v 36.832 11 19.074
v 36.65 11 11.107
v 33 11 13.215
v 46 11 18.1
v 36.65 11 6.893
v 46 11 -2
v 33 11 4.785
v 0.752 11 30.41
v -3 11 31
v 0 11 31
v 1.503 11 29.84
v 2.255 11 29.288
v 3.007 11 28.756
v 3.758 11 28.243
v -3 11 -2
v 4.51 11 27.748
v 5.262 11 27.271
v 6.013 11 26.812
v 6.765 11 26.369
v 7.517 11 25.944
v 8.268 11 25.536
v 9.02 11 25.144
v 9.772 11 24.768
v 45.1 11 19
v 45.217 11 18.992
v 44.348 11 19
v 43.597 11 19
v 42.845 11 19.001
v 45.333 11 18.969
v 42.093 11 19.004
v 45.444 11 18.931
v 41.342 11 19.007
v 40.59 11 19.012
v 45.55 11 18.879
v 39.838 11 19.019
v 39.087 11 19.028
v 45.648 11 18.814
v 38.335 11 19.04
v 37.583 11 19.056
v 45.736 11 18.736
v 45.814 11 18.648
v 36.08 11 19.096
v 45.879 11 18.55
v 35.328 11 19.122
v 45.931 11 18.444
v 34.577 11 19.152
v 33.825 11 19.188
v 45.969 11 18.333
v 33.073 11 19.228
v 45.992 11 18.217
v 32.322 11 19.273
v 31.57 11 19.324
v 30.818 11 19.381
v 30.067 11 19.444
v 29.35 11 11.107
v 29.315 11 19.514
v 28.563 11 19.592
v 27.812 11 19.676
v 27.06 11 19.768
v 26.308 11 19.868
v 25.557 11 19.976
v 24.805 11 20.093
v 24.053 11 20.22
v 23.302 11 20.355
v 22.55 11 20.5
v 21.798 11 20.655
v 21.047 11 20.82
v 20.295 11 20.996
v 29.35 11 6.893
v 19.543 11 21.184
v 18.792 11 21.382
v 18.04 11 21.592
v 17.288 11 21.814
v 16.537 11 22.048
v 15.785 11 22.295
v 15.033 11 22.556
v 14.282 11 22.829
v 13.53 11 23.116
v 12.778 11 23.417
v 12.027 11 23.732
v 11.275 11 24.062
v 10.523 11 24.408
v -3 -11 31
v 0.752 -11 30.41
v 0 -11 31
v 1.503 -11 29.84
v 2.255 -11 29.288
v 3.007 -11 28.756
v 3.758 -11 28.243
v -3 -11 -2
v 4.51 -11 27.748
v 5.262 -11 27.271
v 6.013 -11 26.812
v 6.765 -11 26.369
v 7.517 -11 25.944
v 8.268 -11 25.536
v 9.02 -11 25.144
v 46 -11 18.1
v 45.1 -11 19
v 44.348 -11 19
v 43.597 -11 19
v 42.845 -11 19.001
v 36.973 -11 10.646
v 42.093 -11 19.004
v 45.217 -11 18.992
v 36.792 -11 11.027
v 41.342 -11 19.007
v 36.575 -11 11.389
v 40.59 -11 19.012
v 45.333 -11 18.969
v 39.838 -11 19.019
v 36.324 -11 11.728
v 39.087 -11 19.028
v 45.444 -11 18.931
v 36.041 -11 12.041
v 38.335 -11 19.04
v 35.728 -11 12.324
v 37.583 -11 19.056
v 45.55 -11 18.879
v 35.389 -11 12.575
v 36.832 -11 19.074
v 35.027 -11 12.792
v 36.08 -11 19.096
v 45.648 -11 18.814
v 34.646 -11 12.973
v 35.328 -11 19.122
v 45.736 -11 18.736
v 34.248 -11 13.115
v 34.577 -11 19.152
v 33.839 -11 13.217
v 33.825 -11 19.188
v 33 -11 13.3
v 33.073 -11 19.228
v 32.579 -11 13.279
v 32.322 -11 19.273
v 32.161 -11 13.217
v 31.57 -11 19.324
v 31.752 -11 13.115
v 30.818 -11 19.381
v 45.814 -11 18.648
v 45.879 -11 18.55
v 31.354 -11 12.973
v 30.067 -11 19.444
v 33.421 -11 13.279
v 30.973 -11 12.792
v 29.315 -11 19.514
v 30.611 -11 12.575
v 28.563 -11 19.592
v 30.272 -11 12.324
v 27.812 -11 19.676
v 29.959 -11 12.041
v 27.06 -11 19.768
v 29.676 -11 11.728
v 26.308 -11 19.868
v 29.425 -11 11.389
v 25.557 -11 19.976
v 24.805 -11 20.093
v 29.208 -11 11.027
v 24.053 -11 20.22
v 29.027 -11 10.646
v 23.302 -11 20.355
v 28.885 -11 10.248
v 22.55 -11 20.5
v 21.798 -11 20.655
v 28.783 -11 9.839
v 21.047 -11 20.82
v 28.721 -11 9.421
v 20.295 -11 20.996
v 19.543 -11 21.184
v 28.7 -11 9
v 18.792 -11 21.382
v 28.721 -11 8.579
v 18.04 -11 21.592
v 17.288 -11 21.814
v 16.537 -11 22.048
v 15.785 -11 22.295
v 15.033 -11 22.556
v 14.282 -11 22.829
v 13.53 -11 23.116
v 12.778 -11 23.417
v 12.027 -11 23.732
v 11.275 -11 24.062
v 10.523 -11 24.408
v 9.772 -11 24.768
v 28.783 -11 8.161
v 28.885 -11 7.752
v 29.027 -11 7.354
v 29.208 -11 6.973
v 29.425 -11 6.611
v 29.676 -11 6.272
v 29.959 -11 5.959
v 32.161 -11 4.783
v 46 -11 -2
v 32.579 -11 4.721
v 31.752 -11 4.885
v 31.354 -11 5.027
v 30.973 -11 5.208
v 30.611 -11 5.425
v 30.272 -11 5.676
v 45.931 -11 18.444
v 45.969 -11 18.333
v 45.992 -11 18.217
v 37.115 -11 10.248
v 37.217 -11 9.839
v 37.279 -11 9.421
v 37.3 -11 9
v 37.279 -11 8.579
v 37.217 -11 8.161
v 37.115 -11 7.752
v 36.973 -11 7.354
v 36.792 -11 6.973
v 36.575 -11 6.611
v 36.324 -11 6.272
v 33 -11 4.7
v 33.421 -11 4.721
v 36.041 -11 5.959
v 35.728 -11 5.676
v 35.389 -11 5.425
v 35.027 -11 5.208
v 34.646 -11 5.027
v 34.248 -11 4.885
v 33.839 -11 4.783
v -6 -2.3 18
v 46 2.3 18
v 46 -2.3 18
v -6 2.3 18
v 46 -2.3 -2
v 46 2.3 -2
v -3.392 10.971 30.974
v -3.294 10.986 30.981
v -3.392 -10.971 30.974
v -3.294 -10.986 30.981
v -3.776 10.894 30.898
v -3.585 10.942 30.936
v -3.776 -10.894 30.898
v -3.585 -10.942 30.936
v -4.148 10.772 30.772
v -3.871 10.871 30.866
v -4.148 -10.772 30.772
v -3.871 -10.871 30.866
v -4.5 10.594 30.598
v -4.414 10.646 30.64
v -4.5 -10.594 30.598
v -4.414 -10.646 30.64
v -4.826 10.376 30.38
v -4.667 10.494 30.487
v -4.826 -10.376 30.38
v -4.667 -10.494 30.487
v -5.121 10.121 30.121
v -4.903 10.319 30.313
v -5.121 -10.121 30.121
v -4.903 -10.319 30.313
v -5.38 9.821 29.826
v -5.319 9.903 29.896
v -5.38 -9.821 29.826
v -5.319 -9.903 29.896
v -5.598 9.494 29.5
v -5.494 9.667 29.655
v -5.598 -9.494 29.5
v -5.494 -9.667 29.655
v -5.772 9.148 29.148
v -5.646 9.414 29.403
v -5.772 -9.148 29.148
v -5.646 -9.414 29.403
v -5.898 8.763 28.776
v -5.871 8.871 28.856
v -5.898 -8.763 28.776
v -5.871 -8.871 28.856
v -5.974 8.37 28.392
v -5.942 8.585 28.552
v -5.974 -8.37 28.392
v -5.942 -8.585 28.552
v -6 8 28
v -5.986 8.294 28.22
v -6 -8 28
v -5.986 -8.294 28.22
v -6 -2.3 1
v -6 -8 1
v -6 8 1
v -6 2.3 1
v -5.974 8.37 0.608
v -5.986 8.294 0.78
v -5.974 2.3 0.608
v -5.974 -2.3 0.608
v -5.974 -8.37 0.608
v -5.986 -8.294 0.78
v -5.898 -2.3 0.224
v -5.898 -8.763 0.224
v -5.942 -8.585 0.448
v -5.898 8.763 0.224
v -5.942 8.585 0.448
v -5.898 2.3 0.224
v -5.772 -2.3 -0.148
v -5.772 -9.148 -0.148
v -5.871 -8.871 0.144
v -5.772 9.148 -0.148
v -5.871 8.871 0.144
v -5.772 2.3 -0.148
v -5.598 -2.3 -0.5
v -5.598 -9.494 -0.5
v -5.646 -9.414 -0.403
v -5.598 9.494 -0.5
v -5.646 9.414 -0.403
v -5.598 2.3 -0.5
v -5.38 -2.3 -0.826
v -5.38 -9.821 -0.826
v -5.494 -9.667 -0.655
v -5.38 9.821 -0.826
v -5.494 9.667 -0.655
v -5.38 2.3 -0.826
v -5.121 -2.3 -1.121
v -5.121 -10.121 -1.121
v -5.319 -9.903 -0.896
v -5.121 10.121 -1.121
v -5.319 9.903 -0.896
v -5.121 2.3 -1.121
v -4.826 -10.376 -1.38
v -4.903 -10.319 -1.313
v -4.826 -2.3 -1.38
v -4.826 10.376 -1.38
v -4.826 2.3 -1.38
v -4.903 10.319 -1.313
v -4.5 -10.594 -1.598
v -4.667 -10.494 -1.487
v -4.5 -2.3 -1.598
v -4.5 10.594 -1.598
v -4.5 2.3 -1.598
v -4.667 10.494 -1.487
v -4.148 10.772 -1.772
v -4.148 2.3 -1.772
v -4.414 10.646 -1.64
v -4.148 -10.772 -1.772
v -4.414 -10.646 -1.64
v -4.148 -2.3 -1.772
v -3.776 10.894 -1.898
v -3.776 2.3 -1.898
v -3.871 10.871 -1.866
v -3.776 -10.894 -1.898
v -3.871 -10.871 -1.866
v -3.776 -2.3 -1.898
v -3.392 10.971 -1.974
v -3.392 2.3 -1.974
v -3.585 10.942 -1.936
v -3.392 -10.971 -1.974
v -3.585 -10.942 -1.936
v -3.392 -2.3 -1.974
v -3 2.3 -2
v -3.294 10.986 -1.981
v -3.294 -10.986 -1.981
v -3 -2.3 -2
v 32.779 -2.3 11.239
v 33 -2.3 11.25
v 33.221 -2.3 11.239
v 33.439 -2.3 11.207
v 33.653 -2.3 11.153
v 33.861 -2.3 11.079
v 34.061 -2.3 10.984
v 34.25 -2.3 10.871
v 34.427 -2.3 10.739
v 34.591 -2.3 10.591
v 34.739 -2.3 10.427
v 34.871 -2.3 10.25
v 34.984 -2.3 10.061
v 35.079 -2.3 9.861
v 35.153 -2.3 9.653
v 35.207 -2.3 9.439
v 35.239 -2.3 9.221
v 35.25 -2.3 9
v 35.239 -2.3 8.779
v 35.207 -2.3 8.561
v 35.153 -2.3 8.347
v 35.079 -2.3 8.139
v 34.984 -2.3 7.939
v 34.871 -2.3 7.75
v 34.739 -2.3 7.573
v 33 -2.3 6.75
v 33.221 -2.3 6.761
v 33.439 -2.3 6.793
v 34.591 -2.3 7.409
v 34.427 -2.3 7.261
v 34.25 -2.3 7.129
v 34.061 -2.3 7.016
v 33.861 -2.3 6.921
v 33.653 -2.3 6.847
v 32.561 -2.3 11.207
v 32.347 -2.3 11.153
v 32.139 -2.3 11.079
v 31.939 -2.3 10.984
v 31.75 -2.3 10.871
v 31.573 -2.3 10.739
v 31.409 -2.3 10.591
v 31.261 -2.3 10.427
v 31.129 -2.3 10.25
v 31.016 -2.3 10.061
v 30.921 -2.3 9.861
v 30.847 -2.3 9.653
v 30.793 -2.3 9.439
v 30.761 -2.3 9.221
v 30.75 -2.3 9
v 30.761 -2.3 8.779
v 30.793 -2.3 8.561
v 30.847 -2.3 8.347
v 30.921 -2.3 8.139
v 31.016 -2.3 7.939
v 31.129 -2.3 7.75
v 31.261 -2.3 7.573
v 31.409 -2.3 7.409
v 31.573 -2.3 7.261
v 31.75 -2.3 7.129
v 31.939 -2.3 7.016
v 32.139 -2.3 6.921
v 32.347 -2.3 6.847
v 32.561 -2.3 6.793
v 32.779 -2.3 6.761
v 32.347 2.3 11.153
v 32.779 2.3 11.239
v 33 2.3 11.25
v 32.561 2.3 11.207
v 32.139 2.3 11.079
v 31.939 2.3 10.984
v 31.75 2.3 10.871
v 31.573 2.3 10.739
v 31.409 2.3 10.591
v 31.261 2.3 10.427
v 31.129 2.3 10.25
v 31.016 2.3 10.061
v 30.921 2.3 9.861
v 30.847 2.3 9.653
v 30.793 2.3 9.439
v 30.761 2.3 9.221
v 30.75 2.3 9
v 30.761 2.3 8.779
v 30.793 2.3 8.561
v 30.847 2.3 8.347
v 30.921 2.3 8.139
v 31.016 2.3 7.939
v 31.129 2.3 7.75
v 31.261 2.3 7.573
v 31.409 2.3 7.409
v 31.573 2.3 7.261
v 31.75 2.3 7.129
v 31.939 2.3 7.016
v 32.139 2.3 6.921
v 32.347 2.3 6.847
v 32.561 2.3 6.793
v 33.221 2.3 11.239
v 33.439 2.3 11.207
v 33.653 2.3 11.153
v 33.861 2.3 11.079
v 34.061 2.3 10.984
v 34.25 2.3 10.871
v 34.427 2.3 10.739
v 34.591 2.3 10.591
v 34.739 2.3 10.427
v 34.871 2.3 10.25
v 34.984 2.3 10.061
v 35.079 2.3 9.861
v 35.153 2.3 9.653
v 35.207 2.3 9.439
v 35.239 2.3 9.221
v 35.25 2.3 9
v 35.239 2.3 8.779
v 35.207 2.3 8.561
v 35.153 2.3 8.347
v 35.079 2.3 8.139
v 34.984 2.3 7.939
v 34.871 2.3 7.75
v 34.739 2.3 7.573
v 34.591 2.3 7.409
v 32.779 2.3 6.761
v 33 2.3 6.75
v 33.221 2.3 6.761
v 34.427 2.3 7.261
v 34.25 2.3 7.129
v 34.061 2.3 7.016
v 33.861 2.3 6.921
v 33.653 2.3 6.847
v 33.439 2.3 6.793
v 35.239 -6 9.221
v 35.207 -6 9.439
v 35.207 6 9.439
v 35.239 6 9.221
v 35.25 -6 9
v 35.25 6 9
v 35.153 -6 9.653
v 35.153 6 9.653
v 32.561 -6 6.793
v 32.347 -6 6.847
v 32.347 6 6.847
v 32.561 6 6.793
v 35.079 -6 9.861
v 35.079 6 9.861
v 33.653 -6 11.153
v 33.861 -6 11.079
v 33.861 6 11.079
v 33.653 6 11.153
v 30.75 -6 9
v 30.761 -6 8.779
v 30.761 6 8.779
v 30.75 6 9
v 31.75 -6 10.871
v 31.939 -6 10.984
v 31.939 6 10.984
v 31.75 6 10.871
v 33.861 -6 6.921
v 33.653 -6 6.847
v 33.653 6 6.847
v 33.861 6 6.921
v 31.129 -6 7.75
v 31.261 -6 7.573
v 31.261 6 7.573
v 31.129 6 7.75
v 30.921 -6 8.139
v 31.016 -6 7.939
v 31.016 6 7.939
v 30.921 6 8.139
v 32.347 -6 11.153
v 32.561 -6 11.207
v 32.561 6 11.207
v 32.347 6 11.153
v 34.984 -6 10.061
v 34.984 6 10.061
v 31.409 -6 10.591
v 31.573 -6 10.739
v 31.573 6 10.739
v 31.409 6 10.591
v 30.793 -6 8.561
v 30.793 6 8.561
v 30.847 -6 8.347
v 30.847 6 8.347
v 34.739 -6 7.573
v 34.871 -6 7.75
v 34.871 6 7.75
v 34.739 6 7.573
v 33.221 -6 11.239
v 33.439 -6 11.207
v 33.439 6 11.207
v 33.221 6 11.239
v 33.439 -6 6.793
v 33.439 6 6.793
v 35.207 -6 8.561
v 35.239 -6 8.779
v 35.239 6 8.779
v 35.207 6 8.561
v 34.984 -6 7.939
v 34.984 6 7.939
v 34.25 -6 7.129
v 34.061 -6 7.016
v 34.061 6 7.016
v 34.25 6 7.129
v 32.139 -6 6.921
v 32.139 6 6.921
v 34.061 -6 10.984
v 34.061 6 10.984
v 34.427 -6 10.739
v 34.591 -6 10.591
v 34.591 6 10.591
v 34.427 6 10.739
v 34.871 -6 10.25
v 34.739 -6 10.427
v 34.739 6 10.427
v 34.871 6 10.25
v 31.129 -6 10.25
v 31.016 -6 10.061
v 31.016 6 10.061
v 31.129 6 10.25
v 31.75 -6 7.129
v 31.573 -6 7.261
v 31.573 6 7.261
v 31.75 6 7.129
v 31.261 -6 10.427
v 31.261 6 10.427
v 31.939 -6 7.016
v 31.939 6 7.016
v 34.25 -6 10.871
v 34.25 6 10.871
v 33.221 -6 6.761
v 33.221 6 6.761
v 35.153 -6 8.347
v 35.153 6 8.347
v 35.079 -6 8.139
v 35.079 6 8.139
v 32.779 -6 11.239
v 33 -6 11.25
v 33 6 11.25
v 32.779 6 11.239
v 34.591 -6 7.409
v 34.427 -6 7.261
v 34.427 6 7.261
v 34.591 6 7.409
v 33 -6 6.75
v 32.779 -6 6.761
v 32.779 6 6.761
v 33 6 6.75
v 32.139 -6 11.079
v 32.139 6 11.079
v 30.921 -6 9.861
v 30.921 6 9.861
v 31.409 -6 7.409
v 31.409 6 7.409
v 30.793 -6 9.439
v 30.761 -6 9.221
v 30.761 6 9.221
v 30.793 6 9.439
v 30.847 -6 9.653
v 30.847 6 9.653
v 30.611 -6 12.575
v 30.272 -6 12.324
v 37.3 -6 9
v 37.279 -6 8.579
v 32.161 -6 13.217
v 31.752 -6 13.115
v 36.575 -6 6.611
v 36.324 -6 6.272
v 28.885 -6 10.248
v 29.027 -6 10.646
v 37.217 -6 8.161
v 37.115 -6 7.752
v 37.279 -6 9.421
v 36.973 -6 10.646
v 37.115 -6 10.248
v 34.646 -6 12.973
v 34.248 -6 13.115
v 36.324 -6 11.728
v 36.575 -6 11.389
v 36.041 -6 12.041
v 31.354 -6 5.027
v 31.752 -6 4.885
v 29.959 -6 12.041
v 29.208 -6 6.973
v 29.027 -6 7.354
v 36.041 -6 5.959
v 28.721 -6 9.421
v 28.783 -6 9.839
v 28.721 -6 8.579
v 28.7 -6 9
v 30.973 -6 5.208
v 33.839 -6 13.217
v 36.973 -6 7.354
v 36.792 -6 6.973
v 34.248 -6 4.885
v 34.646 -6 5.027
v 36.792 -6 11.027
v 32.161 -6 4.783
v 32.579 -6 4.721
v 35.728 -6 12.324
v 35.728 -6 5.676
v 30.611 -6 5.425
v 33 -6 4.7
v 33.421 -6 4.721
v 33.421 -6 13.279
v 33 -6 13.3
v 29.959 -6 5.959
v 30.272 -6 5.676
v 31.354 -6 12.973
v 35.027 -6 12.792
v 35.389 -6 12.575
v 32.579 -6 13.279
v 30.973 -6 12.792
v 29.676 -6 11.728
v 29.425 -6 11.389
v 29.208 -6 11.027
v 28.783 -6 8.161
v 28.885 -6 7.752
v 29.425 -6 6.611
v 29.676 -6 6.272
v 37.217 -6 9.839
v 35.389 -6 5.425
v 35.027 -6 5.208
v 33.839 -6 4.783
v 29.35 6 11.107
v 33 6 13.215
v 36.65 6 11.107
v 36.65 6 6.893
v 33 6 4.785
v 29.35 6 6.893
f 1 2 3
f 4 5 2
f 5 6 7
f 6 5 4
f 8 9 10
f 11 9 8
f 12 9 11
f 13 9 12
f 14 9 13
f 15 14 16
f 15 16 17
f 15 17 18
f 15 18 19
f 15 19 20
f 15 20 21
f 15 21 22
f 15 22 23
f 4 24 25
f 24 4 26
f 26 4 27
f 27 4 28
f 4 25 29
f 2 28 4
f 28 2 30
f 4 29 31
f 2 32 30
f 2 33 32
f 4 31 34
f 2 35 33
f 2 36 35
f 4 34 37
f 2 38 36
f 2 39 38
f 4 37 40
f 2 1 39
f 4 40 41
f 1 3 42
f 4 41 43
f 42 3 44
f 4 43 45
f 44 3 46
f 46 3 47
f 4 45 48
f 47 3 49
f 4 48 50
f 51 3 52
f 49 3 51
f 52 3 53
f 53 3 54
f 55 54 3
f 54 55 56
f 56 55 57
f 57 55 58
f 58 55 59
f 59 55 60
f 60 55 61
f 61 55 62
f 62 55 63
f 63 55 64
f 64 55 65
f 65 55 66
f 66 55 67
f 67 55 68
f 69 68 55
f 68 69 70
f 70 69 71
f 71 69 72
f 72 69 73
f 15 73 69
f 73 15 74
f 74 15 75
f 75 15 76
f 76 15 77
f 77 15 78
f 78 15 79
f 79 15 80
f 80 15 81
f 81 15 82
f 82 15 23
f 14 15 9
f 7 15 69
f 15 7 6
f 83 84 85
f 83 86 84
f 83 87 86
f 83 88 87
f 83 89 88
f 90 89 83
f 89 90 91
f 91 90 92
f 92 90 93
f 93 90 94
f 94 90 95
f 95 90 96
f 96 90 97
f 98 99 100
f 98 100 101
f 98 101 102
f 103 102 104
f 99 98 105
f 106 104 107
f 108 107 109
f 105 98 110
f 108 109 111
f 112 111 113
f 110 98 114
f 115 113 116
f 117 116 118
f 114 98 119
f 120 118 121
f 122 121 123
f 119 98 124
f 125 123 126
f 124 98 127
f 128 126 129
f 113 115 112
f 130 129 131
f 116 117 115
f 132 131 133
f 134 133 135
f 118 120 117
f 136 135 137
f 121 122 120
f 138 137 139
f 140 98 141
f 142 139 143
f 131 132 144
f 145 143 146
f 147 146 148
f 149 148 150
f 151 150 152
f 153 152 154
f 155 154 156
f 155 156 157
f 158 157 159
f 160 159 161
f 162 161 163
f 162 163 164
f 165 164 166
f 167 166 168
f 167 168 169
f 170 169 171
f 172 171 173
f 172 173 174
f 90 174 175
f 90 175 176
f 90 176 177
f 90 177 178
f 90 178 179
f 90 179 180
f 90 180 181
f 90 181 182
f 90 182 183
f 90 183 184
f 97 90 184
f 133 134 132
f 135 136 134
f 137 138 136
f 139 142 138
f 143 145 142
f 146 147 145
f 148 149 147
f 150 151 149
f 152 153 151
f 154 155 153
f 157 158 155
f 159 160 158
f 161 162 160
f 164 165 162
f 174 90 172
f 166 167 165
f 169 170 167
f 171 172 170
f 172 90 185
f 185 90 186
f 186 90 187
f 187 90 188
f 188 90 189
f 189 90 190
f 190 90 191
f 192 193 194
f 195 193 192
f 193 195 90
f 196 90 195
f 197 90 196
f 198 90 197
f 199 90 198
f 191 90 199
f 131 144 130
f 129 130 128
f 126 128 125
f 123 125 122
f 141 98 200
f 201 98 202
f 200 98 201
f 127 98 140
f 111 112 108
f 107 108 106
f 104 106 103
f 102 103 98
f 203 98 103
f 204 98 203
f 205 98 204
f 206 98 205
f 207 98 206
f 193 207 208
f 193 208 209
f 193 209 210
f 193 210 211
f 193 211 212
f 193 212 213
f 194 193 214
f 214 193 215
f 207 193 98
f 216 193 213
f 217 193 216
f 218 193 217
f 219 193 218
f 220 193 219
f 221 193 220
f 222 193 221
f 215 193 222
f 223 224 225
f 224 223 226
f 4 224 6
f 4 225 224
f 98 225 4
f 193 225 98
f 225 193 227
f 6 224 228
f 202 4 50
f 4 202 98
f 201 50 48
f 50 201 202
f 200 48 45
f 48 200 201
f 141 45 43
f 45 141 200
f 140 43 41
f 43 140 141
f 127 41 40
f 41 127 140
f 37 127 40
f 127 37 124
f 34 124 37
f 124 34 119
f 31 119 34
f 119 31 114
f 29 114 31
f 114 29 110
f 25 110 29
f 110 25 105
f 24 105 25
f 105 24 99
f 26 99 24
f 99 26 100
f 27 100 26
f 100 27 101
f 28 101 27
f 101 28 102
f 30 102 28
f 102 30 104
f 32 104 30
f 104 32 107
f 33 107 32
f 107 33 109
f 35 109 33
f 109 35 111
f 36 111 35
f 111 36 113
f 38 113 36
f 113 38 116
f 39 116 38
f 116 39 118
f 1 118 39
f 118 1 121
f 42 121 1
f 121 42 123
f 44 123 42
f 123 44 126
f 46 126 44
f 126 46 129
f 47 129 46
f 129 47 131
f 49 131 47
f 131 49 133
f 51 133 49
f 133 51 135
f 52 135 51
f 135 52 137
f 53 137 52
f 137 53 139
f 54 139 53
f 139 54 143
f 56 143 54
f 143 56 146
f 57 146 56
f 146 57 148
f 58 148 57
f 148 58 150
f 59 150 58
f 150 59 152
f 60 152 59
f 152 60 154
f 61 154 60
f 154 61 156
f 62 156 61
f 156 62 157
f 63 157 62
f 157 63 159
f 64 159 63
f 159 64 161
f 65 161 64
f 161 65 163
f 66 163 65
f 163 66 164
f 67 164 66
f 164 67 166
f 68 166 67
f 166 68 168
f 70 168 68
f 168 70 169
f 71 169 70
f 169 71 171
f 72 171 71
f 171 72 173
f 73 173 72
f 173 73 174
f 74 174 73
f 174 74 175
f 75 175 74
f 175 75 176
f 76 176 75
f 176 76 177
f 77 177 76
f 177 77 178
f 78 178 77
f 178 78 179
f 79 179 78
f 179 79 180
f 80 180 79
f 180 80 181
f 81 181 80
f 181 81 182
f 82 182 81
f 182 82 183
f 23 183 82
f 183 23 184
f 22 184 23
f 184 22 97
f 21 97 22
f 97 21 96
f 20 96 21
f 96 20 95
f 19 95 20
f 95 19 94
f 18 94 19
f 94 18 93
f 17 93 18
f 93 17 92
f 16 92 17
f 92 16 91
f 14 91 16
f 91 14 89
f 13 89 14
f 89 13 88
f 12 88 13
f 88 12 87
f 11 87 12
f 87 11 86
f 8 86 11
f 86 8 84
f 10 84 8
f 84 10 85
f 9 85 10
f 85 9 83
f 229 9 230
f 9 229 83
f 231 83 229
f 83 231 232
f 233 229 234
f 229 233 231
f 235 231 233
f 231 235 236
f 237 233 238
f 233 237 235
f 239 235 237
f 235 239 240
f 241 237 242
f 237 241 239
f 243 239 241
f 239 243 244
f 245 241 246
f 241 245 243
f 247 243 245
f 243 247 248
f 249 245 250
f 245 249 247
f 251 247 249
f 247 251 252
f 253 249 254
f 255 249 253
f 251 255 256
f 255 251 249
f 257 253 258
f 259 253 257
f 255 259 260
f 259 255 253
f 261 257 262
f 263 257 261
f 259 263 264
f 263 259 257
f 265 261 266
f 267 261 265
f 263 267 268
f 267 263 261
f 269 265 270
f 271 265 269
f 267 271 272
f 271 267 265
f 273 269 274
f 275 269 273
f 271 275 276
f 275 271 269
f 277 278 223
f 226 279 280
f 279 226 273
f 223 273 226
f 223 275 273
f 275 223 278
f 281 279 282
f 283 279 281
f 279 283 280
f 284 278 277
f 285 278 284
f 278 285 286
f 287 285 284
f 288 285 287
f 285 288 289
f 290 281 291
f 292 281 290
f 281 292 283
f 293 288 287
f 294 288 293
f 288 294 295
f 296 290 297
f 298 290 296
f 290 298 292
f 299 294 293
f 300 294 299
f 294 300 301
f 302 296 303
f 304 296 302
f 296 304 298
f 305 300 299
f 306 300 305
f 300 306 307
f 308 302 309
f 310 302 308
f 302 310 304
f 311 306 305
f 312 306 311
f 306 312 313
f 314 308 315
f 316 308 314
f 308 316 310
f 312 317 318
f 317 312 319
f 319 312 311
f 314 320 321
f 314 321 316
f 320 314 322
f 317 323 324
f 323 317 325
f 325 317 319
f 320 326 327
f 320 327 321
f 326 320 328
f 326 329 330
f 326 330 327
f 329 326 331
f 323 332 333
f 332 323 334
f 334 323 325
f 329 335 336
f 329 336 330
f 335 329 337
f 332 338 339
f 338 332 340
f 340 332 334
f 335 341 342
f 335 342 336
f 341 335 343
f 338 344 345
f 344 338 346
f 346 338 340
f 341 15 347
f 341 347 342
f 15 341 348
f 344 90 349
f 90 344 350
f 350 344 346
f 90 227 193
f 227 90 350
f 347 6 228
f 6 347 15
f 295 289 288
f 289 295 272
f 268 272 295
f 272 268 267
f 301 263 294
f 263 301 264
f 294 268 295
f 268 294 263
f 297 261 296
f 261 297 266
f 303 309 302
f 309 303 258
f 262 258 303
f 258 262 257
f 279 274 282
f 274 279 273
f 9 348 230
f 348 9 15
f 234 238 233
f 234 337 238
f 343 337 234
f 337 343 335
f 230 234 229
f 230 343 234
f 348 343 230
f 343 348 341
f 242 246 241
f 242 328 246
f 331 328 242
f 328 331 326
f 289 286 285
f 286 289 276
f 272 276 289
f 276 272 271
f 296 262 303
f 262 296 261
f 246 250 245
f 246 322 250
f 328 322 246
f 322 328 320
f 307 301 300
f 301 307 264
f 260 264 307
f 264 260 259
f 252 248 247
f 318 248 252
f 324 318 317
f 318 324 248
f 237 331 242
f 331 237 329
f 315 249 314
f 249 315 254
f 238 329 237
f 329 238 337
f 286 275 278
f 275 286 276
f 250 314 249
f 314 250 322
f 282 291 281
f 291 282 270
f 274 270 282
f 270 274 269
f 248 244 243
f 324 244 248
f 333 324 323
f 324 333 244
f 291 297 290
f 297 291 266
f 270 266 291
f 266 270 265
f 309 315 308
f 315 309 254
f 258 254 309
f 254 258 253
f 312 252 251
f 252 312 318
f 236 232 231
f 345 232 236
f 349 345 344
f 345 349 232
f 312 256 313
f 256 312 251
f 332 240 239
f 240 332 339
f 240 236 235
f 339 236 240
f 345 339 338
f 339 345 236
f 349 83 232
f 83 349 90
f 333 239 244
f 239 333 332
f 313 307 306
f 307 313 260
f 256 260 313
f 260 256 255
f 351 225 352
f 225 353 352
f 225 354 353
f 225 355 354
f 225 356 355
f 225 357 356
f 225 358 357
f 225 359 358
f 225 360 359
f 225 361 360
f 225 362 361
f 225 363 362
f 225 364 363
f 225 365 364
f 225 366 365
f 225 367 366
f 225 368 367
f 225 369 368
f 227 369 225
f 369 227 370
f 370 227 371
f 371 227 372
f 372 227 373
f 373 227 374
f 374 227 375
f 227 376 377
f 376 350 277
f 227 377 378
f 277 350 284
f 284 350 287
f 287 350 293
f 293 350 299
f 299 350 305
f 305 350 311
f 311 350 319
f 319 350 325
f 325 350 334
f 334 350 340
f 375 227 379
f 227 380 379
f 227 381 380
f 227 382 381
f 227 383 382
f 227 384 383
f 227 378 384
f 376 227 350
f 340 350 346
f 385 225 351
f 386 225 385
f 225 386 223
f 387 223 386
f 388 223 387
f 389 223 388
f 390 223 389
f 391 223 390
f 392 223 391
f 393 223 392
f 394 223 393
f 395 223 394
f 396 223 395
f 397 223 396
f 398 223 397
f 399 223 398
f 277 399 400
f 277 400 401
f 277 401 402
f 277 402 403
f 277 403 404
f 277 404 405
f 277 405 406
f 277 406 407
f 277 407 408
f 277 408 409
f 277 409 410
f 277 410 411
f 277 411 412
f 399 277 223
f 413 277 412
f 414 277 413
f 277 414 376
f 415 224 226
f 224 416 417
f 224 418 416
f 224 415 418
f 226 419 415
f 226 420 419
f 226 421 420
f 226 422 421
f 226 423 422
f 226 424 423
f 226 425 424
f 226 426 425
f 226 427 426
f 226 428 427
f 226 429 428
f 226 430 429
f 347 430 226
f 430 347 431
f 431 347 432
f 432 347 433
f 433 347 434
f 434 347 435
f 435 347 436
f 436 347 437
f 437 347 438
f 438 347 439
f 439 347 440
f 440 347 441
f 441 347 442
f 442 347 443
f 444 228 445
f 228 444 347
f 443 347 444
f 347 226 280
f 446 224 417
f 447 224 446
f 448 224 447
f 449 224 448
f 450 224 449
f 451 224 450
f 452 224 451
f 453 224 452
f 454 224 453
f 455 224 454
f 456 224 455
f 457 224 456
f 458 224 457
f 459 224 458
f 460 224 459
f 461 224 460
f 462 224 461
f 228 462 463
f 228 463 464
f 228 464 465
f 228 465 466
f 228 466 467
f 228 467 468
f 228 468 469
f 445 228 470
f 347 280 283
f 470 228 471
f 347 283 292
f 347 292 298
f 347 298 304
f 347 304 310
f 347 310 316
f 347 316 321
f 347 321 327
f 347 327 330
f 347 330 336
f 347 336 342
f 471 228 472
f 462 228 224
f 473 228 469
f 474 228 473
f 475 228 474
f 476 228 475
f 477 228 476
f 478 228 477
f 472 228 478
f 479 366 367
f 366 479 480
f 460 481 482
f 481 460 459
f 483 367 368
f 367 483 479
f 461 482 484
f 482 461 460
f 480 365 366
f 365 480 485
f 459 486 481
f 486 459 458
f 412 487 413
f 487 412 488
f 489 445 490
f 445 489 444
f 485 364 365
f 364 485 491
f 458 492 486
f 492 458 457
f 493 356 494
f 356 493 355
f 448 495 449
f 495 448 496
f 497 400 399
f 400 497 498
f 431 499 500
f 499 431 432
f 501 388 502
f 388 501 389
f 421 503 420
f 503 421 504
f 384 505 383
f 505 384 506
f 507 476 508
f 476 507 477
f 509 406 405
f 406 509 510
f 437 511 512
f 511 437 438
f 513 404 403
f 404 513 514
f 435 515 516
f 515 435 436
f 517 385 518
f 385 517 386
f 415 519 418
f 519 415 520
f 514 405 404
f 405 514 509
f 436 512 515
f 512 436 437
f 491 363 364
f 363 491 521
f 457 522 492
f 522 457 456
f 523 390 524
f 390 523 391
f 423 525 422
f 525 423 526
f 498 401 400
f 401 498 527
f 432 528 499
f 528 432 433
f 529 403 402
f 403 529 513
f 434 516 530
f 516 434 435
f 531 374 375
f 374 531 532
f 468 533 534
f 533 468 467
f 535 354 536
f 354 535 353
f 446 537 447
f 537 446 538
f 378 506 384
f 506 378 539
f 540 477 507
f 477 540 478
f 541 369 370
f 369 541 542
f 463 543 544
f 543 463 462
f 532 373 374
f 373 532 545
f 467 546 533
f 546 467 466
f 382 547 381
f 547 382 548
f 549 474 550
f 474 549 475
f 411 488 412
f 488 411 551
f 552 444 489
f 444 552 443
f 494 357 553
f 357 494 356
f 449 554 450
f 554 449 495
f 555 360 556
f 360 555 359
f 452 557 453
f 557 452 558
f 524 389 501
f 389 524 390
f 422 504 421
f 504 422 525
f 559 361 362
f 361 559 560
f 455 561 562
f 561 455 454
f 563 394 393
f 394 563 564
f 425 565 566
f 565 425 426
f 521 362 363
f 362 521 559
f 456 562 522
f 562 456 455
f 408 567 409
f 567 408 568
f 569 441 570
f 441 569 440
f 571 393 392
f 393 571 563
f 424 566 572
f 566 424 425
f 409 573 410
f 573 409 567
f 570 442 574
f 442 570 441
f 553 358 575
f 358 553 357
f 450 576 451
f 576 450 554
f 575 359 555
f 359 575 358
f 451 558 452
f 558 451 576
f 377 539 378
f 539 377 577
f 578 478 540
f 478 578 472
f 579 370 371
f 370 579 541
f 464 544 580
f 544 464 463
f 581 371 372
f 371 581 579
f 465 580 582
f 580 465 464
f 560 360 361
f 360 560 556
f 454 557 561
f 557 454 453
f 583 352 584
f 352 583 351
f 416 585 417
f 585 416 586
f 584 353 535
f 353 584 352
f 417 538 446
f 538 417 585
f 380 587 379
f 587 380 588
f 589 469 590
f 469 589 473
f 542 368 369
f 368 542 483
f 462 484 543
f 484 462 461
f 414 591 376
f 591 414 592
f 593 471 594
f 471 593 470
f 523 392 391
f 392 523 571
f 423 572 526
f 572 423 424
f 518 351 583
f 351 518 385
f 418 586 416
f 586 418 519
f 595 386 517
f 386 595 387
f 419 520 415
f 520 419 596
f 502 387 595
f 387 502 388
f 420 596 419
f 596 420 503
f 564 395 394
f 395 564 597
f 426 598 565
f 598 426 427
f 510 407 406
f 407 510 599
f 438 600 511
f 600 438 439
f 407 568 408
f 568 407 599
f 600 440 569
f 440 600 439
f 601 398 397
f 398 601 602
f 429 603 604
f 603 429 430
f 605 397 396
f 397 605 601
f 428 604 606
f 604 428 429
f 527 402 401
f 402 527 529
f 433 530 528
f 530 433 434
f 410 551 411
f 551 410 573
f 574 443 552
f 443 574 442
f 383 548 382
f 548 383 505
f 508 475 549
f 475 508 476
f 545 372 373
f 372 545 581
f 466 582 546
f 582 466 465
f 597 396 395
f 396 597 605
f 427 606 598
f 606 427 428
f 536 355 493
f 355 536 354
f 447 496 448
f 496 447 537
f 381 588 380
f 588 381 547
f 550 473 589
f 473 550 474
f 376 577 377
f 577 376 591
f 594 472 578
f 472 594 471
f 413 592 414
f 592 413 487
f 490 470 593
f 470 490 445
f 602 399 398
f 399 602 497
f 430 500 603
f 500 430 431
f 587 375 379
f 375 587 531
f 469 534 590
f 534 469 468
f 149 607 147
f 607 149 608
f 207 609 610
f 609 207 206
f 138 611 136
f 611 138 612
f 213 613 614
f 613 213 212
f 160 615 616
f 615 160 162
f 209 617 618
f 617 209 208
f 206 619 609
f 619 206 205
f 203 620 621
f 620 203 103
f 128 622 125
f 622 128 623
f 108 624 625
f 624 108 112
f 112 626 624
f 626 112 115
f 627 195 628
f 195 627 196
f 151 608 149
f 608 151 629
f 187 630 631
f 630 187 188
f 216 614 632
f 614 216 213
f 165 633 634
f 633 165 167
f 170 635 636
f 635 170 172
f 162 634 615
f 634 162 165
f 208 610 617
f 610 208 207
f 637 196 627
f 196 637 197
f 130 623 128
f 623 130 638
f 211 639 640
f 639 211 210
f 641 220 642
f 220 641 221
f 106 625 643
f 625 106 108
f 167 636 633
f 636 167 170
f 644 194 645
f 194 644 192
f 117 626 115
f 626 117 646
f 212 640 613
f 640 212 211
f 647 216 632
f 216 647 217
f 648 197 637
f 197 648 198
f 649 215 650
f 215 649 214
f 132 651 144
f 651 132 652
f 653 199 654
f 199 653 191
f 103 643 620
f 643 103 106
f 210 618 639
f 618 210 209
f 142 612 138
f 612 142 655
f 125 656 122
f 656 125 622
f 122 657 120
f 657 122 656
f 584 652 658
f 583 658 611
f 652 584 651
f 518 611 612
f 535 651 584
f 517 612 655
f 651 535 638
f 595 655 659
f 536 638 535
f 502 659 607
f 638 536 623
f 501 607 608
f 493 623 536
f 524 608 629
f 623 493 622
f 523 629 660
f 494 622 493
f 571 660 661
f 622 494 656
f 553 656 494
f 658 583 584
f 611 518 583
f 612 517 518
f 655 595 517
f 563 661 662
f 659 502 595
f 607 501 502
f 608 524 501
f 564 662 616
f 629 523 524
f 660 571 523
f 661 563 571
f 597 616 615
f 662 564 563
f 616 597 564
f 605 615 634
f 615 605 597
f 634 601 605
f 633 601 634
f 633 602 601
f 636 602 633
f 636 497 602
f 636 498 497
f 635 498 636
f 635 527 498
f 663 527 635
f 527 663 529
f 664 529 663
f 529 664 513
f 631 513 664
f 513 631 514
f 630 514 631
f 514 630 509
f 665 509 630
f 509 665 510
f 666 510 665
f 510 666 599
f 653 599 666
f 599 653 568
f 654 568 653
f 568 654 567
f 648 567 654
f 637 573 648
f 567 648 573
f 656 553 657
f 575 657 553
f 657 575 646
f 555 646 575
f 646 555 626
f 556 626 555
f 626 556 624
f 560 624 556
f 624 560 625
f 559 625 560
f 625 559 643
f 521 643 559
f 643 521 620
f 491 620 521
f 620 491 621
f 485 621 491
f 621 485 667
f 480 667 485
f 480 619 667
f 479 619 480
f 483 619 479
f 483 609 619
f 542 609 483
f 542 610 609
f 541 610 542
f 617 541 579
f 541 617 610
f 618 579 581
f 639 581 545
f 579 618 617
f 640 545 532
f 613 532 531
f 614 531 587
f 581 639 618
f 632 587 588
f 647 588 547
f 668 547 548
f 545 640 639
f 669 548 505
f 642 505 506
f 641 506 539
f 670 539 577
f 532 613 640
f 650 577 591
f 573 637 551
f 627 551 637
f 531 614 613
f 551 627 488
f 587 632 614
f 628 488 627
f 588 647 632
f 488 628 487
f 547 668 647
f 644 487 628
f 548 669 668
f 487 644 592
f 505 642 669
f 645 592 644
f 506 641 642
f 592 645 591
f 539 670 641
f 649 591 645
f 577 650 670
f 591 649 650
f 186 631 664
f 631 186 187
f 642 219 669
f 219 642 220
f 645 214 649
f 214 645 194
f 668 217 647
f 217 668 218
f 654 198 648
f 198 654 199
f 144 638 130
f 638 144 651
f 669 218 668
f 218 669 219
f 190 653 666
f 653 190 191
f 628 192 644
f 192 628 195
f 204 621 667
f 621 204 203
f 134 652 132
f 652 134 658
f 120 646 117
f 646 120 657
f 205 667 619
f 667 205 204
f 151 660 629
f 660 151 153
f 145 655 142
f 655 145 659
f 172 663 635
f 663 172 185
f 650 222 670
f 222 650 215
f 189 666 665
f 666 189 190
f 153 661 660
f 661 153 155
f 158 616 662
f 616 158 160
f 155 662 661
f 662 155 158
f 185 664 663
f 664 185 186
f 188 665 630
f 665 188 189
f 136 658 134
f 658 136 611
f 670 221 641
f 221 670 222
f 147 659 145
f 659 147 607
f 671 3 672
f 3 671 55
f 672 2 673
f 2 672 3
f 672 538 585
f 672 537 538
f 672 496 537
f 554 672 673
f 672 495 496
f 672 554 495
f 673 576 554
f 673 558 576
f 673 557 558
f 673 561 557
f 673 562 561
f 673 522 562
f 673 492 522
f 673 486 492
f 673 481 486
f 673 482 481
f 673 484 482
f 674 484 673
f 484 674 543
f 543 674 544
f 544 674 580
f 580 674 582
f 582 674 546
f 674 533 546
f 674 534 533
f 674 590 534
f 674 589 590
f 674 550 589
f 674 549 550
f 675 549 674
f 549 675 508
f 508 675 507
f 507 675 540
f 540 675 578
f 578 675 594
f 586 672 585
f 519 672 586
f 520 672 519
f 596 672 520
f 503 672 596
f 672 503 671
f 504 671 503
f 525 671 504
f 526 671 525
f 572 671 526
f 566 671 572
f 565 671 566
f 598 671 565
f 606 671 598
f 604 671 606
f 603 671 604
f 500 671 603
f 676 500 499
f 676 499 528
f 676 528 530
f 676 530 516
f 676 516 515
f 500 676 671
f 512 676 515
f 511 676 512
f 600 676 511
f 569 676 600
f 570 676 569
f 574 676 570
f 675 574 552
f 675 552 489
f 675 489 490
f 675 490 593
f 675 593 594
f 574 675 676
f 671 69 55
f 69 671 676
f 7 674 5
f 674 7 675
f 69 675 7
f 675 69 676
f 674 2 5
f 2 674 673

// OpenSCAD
// Batente v9 para a ponta do suporte das cadeiras (OpenSCAD)
// Eixos: X ao longo do suporte (X=0 na ponta, cresce para dentro do suporte),
//        Y na largura (centrado), Z para cima (Z=0 no fundo do canal).
// Medidas em mm. Parafuso M4 x 16 + porca M4. Cavidades com o formato exato.
// O suporte nao tem paredes externas: a peca tem 22 mm de largura em todos os pontos.
// v8: garras 10 mm mais longas, base 2 mm mais baixa (sem folga), parede 5 mm mais baixa,
//     rampa mais fina com 1 mm de material no fim, curva que cai rente a parede e ponta suave.
// v9: furo do parafuso deslocado 10 mm (acompanha o aumento da extremidade): fica a 13 mm do fim das garras.

$fn = 64;

// ---------- Medidas do suporte ----------
LARG      = 22;     // largura total (tambem a largura da peca)
DIV       = 3;      // divisao do meio
ALT_CANAL = 18;     // altura do canal
EXT_EXTREMIDADE = 10;   // quanto a peca foi alongada do lado da parede (ponta do suporte fica 10 mm depois da parede)
FURO_X    = 23 + EXT_EXTREMIDADE;  // furo de 5 mm: 23 mm da ponta do suporte, medido a partir da parede

// ---------- Parametros da peca ----------
FOLGA      = 0.3;   // folga de encaixe para impressao 3D
ESP_PAREDE = 6;     // espessura da parede na ponta (X de -6 a 0)
ALT_PAREDE = 13;    // altura da parede acima do canal (era 18)
COMP_GARRA = 46;    // comprimento das garras dentro dos canais (era 36)
BASE_EXTRA = 2;     // a peca desce 2 mm alem do fundo antigo, para eliminar a folga na base
FOLGA_SULCO = 0.5;  // folga extra de cada lado do sulco (sulco 1 mm mais largo)
R_BORDA    = 3;     // raio do arredondamento das bordas da face externa da parede
H_FIM      = 1.0;   // espessura da rampa no fim, acima das garras (evita falta de material)
R_NARIZ    = 0.9;   // raio do arredondamento da ponta da rampa (ponta suave, sem quina)
P_CURVA    = 3;     // forca da curva: maior = cai mais rapido junto da parede

// ---------- Parafuso M4 x 16 e porca M4 ----------
FURO_D     = 4.5;   // furo passante M4
CABECA_D   = 8.6;   // cabeca panela M4 (8,0) + folga
CABECA_PROF = 5.0;  // cabeca panela (3,1) ou cilindrica (4,0) fica rebaixada
PORCA_AF   = 7.3;   // porca M4: 7,0 entre faces + folga
PORCA_PROF = 5.0;   // porca M4 (3,2) encostada no fundo; M4x16 atravessa a porca inteira

// ---------- Derivados ----------
VAO        = DIV + 2*FOLGA + 2*FOLGA_SULCO; // sulco central onde passa a divisao (4,6 mm)
LARG_GARRA = (LARG - VAO) / 2;          // cada garra vai da borda de 22 mm ate o vao
Y_CENTRO   = VAO/2 + LARG_GARRA/2;      // centro de cada garra
Y_EXT      = LARG/2;                    // face externa da garra (|Y| = 11)
Z_FURO     = ALT_CANAL/2;               // altura do furo, igual a v7 (ja estava certo)
R_PORCA    = PORCA_AF / sqrt(3);        // raio circunscrito do sextavado
TOPO       = ALT_CANAL + ALT_PAREDE;

// ---------- Perfil lateral: parede + rampa concava que cai rente a parede ----------
N = 60;
LC = COMP_GARRA - R_NARIZ;               // comprimento da curva, antes da ponta arredondada
// espessura da rampa acima das garras: cai rapido junto da parede e acaba plana
rampa = [ for (i = [0:N]) let(t = i/N)
          [ LC*t, ALT_CANAL + H_FIM + (ALT_PAREDE - H_FIM)*pow(1 - t, P_CURVA) ] ];

function arco(cx, cz, r, a0, a1) = [ for (i = [0:12]) let(a = a0 + (a1 - a0)*i/12)
                                     [ cx + r*cos(a), cz + r*sin(a) ] ];
perfil = concat([[0, -BASE_EXTRA]],
                arco(-ESP_PAREDE + R_BORDA, -BASE_EXTRA + R_BORDA, R_BORDA, 270, 180),  // canto de baixo
                arco(-ESP_PAREDE + R_BORDA, TOPO - R_BORDA, R_BORDA, 180, 90),          // canto de cima
                rampa,
                arco(LC, ALT_CANAL + H_FIM - R_NARIZ, R_NARIZ, 90, 0),                  // ponta suave
                [[COMP_GARRA, ALT_CANAL], [0, ALT_CANAL]]);

module cabeca() {
    // perfil em XZ extrudado ao longo de Y, centrado; a planta arredonda as duas
    // quinas verticais da face externa da parede
    intersection() {
        rotate([90, 0, 0]) linear_extrude(height = LARG, center = true) polygon(perfil);
        translate([0, 0, -BASE_EXTRA - 1]) linear_extrude(height = TOPO + BASE_EXTRA + 2) hull() {
            translate([-ESP_PAREDE + R_BORDA, -LARG/2])
                square([ESP_PAREDE + COMP_GARRA - R_BORDA, LARG]);
            for (lado = [-1, 1])
                translate([-ESP_PAREDE + R_BORDA, lado*(LARG/2 - R_BORDA)]) circle(r = R_BORDA);
        }
    }
}

module garra(y0, y1) {
    // garra reta entre y0 e y1; entra 0,5 mm na parede para soldar no mesmo corpo
    translate([-0.5, y0, -BASE_EXTRA]) cube([COMP_GARRA + 0.5, y1 - y0, ALT_CANAL + BASE_EXTRA]);
}

module garras() {
    // duas garras que somam 22 mm de largura, com o sulco no meio
    garra(-Y_EXT, -VAO/2);
    garra(VAO/2, Y_EXT);
}

module sulco_passante() {
    // sulco central de ponta a ponta: atravessa tambem a parede da ponta
    translate([-ESP_PAREDE - 1, -VAO/2, -BASE_EXTRA - 1])
        cube([ESP_PAREDE + COMP_GARRA + 2, VAO, ALT_CANAL + BASE_EXTRA + 1]);
}

module furo_parafuso() {
    translate([FURO_X, 0, Z_FURO]) rotate([90, 0, 0])
        cylinder(d = FURO_D, h = LARG + 4, center = true);
}

module rebaixo_cabeca() {   // cilindro exato, no lado -Y
    translate([FURO_X, -Y_EXT - 0.01, Z_FURO]) rotate([-90, 0, 0])
        cylinder(d = CABECA_D, h = CABECA_PROF + 0.01);
}

module sextavado_porca() {  // sextavado exato, no lado +Y
    translate([FURO_X, Y_EXT + 0.01, Z_FURO]) rotate([90, 0, 0])
        rotate([0, 0, 30])  // cantos para cima/baixo, faces planas nas laterais
            cylinder(r = R_PORCA, h = PORCA_PROF + 0.01, $fn = 6);
}

difference() {
    union() { cabeca(); garras(); }
    sulco_passante();
    furo_parafuso();
    rebaixo_cabeca();
    sextavado_porca();
}
